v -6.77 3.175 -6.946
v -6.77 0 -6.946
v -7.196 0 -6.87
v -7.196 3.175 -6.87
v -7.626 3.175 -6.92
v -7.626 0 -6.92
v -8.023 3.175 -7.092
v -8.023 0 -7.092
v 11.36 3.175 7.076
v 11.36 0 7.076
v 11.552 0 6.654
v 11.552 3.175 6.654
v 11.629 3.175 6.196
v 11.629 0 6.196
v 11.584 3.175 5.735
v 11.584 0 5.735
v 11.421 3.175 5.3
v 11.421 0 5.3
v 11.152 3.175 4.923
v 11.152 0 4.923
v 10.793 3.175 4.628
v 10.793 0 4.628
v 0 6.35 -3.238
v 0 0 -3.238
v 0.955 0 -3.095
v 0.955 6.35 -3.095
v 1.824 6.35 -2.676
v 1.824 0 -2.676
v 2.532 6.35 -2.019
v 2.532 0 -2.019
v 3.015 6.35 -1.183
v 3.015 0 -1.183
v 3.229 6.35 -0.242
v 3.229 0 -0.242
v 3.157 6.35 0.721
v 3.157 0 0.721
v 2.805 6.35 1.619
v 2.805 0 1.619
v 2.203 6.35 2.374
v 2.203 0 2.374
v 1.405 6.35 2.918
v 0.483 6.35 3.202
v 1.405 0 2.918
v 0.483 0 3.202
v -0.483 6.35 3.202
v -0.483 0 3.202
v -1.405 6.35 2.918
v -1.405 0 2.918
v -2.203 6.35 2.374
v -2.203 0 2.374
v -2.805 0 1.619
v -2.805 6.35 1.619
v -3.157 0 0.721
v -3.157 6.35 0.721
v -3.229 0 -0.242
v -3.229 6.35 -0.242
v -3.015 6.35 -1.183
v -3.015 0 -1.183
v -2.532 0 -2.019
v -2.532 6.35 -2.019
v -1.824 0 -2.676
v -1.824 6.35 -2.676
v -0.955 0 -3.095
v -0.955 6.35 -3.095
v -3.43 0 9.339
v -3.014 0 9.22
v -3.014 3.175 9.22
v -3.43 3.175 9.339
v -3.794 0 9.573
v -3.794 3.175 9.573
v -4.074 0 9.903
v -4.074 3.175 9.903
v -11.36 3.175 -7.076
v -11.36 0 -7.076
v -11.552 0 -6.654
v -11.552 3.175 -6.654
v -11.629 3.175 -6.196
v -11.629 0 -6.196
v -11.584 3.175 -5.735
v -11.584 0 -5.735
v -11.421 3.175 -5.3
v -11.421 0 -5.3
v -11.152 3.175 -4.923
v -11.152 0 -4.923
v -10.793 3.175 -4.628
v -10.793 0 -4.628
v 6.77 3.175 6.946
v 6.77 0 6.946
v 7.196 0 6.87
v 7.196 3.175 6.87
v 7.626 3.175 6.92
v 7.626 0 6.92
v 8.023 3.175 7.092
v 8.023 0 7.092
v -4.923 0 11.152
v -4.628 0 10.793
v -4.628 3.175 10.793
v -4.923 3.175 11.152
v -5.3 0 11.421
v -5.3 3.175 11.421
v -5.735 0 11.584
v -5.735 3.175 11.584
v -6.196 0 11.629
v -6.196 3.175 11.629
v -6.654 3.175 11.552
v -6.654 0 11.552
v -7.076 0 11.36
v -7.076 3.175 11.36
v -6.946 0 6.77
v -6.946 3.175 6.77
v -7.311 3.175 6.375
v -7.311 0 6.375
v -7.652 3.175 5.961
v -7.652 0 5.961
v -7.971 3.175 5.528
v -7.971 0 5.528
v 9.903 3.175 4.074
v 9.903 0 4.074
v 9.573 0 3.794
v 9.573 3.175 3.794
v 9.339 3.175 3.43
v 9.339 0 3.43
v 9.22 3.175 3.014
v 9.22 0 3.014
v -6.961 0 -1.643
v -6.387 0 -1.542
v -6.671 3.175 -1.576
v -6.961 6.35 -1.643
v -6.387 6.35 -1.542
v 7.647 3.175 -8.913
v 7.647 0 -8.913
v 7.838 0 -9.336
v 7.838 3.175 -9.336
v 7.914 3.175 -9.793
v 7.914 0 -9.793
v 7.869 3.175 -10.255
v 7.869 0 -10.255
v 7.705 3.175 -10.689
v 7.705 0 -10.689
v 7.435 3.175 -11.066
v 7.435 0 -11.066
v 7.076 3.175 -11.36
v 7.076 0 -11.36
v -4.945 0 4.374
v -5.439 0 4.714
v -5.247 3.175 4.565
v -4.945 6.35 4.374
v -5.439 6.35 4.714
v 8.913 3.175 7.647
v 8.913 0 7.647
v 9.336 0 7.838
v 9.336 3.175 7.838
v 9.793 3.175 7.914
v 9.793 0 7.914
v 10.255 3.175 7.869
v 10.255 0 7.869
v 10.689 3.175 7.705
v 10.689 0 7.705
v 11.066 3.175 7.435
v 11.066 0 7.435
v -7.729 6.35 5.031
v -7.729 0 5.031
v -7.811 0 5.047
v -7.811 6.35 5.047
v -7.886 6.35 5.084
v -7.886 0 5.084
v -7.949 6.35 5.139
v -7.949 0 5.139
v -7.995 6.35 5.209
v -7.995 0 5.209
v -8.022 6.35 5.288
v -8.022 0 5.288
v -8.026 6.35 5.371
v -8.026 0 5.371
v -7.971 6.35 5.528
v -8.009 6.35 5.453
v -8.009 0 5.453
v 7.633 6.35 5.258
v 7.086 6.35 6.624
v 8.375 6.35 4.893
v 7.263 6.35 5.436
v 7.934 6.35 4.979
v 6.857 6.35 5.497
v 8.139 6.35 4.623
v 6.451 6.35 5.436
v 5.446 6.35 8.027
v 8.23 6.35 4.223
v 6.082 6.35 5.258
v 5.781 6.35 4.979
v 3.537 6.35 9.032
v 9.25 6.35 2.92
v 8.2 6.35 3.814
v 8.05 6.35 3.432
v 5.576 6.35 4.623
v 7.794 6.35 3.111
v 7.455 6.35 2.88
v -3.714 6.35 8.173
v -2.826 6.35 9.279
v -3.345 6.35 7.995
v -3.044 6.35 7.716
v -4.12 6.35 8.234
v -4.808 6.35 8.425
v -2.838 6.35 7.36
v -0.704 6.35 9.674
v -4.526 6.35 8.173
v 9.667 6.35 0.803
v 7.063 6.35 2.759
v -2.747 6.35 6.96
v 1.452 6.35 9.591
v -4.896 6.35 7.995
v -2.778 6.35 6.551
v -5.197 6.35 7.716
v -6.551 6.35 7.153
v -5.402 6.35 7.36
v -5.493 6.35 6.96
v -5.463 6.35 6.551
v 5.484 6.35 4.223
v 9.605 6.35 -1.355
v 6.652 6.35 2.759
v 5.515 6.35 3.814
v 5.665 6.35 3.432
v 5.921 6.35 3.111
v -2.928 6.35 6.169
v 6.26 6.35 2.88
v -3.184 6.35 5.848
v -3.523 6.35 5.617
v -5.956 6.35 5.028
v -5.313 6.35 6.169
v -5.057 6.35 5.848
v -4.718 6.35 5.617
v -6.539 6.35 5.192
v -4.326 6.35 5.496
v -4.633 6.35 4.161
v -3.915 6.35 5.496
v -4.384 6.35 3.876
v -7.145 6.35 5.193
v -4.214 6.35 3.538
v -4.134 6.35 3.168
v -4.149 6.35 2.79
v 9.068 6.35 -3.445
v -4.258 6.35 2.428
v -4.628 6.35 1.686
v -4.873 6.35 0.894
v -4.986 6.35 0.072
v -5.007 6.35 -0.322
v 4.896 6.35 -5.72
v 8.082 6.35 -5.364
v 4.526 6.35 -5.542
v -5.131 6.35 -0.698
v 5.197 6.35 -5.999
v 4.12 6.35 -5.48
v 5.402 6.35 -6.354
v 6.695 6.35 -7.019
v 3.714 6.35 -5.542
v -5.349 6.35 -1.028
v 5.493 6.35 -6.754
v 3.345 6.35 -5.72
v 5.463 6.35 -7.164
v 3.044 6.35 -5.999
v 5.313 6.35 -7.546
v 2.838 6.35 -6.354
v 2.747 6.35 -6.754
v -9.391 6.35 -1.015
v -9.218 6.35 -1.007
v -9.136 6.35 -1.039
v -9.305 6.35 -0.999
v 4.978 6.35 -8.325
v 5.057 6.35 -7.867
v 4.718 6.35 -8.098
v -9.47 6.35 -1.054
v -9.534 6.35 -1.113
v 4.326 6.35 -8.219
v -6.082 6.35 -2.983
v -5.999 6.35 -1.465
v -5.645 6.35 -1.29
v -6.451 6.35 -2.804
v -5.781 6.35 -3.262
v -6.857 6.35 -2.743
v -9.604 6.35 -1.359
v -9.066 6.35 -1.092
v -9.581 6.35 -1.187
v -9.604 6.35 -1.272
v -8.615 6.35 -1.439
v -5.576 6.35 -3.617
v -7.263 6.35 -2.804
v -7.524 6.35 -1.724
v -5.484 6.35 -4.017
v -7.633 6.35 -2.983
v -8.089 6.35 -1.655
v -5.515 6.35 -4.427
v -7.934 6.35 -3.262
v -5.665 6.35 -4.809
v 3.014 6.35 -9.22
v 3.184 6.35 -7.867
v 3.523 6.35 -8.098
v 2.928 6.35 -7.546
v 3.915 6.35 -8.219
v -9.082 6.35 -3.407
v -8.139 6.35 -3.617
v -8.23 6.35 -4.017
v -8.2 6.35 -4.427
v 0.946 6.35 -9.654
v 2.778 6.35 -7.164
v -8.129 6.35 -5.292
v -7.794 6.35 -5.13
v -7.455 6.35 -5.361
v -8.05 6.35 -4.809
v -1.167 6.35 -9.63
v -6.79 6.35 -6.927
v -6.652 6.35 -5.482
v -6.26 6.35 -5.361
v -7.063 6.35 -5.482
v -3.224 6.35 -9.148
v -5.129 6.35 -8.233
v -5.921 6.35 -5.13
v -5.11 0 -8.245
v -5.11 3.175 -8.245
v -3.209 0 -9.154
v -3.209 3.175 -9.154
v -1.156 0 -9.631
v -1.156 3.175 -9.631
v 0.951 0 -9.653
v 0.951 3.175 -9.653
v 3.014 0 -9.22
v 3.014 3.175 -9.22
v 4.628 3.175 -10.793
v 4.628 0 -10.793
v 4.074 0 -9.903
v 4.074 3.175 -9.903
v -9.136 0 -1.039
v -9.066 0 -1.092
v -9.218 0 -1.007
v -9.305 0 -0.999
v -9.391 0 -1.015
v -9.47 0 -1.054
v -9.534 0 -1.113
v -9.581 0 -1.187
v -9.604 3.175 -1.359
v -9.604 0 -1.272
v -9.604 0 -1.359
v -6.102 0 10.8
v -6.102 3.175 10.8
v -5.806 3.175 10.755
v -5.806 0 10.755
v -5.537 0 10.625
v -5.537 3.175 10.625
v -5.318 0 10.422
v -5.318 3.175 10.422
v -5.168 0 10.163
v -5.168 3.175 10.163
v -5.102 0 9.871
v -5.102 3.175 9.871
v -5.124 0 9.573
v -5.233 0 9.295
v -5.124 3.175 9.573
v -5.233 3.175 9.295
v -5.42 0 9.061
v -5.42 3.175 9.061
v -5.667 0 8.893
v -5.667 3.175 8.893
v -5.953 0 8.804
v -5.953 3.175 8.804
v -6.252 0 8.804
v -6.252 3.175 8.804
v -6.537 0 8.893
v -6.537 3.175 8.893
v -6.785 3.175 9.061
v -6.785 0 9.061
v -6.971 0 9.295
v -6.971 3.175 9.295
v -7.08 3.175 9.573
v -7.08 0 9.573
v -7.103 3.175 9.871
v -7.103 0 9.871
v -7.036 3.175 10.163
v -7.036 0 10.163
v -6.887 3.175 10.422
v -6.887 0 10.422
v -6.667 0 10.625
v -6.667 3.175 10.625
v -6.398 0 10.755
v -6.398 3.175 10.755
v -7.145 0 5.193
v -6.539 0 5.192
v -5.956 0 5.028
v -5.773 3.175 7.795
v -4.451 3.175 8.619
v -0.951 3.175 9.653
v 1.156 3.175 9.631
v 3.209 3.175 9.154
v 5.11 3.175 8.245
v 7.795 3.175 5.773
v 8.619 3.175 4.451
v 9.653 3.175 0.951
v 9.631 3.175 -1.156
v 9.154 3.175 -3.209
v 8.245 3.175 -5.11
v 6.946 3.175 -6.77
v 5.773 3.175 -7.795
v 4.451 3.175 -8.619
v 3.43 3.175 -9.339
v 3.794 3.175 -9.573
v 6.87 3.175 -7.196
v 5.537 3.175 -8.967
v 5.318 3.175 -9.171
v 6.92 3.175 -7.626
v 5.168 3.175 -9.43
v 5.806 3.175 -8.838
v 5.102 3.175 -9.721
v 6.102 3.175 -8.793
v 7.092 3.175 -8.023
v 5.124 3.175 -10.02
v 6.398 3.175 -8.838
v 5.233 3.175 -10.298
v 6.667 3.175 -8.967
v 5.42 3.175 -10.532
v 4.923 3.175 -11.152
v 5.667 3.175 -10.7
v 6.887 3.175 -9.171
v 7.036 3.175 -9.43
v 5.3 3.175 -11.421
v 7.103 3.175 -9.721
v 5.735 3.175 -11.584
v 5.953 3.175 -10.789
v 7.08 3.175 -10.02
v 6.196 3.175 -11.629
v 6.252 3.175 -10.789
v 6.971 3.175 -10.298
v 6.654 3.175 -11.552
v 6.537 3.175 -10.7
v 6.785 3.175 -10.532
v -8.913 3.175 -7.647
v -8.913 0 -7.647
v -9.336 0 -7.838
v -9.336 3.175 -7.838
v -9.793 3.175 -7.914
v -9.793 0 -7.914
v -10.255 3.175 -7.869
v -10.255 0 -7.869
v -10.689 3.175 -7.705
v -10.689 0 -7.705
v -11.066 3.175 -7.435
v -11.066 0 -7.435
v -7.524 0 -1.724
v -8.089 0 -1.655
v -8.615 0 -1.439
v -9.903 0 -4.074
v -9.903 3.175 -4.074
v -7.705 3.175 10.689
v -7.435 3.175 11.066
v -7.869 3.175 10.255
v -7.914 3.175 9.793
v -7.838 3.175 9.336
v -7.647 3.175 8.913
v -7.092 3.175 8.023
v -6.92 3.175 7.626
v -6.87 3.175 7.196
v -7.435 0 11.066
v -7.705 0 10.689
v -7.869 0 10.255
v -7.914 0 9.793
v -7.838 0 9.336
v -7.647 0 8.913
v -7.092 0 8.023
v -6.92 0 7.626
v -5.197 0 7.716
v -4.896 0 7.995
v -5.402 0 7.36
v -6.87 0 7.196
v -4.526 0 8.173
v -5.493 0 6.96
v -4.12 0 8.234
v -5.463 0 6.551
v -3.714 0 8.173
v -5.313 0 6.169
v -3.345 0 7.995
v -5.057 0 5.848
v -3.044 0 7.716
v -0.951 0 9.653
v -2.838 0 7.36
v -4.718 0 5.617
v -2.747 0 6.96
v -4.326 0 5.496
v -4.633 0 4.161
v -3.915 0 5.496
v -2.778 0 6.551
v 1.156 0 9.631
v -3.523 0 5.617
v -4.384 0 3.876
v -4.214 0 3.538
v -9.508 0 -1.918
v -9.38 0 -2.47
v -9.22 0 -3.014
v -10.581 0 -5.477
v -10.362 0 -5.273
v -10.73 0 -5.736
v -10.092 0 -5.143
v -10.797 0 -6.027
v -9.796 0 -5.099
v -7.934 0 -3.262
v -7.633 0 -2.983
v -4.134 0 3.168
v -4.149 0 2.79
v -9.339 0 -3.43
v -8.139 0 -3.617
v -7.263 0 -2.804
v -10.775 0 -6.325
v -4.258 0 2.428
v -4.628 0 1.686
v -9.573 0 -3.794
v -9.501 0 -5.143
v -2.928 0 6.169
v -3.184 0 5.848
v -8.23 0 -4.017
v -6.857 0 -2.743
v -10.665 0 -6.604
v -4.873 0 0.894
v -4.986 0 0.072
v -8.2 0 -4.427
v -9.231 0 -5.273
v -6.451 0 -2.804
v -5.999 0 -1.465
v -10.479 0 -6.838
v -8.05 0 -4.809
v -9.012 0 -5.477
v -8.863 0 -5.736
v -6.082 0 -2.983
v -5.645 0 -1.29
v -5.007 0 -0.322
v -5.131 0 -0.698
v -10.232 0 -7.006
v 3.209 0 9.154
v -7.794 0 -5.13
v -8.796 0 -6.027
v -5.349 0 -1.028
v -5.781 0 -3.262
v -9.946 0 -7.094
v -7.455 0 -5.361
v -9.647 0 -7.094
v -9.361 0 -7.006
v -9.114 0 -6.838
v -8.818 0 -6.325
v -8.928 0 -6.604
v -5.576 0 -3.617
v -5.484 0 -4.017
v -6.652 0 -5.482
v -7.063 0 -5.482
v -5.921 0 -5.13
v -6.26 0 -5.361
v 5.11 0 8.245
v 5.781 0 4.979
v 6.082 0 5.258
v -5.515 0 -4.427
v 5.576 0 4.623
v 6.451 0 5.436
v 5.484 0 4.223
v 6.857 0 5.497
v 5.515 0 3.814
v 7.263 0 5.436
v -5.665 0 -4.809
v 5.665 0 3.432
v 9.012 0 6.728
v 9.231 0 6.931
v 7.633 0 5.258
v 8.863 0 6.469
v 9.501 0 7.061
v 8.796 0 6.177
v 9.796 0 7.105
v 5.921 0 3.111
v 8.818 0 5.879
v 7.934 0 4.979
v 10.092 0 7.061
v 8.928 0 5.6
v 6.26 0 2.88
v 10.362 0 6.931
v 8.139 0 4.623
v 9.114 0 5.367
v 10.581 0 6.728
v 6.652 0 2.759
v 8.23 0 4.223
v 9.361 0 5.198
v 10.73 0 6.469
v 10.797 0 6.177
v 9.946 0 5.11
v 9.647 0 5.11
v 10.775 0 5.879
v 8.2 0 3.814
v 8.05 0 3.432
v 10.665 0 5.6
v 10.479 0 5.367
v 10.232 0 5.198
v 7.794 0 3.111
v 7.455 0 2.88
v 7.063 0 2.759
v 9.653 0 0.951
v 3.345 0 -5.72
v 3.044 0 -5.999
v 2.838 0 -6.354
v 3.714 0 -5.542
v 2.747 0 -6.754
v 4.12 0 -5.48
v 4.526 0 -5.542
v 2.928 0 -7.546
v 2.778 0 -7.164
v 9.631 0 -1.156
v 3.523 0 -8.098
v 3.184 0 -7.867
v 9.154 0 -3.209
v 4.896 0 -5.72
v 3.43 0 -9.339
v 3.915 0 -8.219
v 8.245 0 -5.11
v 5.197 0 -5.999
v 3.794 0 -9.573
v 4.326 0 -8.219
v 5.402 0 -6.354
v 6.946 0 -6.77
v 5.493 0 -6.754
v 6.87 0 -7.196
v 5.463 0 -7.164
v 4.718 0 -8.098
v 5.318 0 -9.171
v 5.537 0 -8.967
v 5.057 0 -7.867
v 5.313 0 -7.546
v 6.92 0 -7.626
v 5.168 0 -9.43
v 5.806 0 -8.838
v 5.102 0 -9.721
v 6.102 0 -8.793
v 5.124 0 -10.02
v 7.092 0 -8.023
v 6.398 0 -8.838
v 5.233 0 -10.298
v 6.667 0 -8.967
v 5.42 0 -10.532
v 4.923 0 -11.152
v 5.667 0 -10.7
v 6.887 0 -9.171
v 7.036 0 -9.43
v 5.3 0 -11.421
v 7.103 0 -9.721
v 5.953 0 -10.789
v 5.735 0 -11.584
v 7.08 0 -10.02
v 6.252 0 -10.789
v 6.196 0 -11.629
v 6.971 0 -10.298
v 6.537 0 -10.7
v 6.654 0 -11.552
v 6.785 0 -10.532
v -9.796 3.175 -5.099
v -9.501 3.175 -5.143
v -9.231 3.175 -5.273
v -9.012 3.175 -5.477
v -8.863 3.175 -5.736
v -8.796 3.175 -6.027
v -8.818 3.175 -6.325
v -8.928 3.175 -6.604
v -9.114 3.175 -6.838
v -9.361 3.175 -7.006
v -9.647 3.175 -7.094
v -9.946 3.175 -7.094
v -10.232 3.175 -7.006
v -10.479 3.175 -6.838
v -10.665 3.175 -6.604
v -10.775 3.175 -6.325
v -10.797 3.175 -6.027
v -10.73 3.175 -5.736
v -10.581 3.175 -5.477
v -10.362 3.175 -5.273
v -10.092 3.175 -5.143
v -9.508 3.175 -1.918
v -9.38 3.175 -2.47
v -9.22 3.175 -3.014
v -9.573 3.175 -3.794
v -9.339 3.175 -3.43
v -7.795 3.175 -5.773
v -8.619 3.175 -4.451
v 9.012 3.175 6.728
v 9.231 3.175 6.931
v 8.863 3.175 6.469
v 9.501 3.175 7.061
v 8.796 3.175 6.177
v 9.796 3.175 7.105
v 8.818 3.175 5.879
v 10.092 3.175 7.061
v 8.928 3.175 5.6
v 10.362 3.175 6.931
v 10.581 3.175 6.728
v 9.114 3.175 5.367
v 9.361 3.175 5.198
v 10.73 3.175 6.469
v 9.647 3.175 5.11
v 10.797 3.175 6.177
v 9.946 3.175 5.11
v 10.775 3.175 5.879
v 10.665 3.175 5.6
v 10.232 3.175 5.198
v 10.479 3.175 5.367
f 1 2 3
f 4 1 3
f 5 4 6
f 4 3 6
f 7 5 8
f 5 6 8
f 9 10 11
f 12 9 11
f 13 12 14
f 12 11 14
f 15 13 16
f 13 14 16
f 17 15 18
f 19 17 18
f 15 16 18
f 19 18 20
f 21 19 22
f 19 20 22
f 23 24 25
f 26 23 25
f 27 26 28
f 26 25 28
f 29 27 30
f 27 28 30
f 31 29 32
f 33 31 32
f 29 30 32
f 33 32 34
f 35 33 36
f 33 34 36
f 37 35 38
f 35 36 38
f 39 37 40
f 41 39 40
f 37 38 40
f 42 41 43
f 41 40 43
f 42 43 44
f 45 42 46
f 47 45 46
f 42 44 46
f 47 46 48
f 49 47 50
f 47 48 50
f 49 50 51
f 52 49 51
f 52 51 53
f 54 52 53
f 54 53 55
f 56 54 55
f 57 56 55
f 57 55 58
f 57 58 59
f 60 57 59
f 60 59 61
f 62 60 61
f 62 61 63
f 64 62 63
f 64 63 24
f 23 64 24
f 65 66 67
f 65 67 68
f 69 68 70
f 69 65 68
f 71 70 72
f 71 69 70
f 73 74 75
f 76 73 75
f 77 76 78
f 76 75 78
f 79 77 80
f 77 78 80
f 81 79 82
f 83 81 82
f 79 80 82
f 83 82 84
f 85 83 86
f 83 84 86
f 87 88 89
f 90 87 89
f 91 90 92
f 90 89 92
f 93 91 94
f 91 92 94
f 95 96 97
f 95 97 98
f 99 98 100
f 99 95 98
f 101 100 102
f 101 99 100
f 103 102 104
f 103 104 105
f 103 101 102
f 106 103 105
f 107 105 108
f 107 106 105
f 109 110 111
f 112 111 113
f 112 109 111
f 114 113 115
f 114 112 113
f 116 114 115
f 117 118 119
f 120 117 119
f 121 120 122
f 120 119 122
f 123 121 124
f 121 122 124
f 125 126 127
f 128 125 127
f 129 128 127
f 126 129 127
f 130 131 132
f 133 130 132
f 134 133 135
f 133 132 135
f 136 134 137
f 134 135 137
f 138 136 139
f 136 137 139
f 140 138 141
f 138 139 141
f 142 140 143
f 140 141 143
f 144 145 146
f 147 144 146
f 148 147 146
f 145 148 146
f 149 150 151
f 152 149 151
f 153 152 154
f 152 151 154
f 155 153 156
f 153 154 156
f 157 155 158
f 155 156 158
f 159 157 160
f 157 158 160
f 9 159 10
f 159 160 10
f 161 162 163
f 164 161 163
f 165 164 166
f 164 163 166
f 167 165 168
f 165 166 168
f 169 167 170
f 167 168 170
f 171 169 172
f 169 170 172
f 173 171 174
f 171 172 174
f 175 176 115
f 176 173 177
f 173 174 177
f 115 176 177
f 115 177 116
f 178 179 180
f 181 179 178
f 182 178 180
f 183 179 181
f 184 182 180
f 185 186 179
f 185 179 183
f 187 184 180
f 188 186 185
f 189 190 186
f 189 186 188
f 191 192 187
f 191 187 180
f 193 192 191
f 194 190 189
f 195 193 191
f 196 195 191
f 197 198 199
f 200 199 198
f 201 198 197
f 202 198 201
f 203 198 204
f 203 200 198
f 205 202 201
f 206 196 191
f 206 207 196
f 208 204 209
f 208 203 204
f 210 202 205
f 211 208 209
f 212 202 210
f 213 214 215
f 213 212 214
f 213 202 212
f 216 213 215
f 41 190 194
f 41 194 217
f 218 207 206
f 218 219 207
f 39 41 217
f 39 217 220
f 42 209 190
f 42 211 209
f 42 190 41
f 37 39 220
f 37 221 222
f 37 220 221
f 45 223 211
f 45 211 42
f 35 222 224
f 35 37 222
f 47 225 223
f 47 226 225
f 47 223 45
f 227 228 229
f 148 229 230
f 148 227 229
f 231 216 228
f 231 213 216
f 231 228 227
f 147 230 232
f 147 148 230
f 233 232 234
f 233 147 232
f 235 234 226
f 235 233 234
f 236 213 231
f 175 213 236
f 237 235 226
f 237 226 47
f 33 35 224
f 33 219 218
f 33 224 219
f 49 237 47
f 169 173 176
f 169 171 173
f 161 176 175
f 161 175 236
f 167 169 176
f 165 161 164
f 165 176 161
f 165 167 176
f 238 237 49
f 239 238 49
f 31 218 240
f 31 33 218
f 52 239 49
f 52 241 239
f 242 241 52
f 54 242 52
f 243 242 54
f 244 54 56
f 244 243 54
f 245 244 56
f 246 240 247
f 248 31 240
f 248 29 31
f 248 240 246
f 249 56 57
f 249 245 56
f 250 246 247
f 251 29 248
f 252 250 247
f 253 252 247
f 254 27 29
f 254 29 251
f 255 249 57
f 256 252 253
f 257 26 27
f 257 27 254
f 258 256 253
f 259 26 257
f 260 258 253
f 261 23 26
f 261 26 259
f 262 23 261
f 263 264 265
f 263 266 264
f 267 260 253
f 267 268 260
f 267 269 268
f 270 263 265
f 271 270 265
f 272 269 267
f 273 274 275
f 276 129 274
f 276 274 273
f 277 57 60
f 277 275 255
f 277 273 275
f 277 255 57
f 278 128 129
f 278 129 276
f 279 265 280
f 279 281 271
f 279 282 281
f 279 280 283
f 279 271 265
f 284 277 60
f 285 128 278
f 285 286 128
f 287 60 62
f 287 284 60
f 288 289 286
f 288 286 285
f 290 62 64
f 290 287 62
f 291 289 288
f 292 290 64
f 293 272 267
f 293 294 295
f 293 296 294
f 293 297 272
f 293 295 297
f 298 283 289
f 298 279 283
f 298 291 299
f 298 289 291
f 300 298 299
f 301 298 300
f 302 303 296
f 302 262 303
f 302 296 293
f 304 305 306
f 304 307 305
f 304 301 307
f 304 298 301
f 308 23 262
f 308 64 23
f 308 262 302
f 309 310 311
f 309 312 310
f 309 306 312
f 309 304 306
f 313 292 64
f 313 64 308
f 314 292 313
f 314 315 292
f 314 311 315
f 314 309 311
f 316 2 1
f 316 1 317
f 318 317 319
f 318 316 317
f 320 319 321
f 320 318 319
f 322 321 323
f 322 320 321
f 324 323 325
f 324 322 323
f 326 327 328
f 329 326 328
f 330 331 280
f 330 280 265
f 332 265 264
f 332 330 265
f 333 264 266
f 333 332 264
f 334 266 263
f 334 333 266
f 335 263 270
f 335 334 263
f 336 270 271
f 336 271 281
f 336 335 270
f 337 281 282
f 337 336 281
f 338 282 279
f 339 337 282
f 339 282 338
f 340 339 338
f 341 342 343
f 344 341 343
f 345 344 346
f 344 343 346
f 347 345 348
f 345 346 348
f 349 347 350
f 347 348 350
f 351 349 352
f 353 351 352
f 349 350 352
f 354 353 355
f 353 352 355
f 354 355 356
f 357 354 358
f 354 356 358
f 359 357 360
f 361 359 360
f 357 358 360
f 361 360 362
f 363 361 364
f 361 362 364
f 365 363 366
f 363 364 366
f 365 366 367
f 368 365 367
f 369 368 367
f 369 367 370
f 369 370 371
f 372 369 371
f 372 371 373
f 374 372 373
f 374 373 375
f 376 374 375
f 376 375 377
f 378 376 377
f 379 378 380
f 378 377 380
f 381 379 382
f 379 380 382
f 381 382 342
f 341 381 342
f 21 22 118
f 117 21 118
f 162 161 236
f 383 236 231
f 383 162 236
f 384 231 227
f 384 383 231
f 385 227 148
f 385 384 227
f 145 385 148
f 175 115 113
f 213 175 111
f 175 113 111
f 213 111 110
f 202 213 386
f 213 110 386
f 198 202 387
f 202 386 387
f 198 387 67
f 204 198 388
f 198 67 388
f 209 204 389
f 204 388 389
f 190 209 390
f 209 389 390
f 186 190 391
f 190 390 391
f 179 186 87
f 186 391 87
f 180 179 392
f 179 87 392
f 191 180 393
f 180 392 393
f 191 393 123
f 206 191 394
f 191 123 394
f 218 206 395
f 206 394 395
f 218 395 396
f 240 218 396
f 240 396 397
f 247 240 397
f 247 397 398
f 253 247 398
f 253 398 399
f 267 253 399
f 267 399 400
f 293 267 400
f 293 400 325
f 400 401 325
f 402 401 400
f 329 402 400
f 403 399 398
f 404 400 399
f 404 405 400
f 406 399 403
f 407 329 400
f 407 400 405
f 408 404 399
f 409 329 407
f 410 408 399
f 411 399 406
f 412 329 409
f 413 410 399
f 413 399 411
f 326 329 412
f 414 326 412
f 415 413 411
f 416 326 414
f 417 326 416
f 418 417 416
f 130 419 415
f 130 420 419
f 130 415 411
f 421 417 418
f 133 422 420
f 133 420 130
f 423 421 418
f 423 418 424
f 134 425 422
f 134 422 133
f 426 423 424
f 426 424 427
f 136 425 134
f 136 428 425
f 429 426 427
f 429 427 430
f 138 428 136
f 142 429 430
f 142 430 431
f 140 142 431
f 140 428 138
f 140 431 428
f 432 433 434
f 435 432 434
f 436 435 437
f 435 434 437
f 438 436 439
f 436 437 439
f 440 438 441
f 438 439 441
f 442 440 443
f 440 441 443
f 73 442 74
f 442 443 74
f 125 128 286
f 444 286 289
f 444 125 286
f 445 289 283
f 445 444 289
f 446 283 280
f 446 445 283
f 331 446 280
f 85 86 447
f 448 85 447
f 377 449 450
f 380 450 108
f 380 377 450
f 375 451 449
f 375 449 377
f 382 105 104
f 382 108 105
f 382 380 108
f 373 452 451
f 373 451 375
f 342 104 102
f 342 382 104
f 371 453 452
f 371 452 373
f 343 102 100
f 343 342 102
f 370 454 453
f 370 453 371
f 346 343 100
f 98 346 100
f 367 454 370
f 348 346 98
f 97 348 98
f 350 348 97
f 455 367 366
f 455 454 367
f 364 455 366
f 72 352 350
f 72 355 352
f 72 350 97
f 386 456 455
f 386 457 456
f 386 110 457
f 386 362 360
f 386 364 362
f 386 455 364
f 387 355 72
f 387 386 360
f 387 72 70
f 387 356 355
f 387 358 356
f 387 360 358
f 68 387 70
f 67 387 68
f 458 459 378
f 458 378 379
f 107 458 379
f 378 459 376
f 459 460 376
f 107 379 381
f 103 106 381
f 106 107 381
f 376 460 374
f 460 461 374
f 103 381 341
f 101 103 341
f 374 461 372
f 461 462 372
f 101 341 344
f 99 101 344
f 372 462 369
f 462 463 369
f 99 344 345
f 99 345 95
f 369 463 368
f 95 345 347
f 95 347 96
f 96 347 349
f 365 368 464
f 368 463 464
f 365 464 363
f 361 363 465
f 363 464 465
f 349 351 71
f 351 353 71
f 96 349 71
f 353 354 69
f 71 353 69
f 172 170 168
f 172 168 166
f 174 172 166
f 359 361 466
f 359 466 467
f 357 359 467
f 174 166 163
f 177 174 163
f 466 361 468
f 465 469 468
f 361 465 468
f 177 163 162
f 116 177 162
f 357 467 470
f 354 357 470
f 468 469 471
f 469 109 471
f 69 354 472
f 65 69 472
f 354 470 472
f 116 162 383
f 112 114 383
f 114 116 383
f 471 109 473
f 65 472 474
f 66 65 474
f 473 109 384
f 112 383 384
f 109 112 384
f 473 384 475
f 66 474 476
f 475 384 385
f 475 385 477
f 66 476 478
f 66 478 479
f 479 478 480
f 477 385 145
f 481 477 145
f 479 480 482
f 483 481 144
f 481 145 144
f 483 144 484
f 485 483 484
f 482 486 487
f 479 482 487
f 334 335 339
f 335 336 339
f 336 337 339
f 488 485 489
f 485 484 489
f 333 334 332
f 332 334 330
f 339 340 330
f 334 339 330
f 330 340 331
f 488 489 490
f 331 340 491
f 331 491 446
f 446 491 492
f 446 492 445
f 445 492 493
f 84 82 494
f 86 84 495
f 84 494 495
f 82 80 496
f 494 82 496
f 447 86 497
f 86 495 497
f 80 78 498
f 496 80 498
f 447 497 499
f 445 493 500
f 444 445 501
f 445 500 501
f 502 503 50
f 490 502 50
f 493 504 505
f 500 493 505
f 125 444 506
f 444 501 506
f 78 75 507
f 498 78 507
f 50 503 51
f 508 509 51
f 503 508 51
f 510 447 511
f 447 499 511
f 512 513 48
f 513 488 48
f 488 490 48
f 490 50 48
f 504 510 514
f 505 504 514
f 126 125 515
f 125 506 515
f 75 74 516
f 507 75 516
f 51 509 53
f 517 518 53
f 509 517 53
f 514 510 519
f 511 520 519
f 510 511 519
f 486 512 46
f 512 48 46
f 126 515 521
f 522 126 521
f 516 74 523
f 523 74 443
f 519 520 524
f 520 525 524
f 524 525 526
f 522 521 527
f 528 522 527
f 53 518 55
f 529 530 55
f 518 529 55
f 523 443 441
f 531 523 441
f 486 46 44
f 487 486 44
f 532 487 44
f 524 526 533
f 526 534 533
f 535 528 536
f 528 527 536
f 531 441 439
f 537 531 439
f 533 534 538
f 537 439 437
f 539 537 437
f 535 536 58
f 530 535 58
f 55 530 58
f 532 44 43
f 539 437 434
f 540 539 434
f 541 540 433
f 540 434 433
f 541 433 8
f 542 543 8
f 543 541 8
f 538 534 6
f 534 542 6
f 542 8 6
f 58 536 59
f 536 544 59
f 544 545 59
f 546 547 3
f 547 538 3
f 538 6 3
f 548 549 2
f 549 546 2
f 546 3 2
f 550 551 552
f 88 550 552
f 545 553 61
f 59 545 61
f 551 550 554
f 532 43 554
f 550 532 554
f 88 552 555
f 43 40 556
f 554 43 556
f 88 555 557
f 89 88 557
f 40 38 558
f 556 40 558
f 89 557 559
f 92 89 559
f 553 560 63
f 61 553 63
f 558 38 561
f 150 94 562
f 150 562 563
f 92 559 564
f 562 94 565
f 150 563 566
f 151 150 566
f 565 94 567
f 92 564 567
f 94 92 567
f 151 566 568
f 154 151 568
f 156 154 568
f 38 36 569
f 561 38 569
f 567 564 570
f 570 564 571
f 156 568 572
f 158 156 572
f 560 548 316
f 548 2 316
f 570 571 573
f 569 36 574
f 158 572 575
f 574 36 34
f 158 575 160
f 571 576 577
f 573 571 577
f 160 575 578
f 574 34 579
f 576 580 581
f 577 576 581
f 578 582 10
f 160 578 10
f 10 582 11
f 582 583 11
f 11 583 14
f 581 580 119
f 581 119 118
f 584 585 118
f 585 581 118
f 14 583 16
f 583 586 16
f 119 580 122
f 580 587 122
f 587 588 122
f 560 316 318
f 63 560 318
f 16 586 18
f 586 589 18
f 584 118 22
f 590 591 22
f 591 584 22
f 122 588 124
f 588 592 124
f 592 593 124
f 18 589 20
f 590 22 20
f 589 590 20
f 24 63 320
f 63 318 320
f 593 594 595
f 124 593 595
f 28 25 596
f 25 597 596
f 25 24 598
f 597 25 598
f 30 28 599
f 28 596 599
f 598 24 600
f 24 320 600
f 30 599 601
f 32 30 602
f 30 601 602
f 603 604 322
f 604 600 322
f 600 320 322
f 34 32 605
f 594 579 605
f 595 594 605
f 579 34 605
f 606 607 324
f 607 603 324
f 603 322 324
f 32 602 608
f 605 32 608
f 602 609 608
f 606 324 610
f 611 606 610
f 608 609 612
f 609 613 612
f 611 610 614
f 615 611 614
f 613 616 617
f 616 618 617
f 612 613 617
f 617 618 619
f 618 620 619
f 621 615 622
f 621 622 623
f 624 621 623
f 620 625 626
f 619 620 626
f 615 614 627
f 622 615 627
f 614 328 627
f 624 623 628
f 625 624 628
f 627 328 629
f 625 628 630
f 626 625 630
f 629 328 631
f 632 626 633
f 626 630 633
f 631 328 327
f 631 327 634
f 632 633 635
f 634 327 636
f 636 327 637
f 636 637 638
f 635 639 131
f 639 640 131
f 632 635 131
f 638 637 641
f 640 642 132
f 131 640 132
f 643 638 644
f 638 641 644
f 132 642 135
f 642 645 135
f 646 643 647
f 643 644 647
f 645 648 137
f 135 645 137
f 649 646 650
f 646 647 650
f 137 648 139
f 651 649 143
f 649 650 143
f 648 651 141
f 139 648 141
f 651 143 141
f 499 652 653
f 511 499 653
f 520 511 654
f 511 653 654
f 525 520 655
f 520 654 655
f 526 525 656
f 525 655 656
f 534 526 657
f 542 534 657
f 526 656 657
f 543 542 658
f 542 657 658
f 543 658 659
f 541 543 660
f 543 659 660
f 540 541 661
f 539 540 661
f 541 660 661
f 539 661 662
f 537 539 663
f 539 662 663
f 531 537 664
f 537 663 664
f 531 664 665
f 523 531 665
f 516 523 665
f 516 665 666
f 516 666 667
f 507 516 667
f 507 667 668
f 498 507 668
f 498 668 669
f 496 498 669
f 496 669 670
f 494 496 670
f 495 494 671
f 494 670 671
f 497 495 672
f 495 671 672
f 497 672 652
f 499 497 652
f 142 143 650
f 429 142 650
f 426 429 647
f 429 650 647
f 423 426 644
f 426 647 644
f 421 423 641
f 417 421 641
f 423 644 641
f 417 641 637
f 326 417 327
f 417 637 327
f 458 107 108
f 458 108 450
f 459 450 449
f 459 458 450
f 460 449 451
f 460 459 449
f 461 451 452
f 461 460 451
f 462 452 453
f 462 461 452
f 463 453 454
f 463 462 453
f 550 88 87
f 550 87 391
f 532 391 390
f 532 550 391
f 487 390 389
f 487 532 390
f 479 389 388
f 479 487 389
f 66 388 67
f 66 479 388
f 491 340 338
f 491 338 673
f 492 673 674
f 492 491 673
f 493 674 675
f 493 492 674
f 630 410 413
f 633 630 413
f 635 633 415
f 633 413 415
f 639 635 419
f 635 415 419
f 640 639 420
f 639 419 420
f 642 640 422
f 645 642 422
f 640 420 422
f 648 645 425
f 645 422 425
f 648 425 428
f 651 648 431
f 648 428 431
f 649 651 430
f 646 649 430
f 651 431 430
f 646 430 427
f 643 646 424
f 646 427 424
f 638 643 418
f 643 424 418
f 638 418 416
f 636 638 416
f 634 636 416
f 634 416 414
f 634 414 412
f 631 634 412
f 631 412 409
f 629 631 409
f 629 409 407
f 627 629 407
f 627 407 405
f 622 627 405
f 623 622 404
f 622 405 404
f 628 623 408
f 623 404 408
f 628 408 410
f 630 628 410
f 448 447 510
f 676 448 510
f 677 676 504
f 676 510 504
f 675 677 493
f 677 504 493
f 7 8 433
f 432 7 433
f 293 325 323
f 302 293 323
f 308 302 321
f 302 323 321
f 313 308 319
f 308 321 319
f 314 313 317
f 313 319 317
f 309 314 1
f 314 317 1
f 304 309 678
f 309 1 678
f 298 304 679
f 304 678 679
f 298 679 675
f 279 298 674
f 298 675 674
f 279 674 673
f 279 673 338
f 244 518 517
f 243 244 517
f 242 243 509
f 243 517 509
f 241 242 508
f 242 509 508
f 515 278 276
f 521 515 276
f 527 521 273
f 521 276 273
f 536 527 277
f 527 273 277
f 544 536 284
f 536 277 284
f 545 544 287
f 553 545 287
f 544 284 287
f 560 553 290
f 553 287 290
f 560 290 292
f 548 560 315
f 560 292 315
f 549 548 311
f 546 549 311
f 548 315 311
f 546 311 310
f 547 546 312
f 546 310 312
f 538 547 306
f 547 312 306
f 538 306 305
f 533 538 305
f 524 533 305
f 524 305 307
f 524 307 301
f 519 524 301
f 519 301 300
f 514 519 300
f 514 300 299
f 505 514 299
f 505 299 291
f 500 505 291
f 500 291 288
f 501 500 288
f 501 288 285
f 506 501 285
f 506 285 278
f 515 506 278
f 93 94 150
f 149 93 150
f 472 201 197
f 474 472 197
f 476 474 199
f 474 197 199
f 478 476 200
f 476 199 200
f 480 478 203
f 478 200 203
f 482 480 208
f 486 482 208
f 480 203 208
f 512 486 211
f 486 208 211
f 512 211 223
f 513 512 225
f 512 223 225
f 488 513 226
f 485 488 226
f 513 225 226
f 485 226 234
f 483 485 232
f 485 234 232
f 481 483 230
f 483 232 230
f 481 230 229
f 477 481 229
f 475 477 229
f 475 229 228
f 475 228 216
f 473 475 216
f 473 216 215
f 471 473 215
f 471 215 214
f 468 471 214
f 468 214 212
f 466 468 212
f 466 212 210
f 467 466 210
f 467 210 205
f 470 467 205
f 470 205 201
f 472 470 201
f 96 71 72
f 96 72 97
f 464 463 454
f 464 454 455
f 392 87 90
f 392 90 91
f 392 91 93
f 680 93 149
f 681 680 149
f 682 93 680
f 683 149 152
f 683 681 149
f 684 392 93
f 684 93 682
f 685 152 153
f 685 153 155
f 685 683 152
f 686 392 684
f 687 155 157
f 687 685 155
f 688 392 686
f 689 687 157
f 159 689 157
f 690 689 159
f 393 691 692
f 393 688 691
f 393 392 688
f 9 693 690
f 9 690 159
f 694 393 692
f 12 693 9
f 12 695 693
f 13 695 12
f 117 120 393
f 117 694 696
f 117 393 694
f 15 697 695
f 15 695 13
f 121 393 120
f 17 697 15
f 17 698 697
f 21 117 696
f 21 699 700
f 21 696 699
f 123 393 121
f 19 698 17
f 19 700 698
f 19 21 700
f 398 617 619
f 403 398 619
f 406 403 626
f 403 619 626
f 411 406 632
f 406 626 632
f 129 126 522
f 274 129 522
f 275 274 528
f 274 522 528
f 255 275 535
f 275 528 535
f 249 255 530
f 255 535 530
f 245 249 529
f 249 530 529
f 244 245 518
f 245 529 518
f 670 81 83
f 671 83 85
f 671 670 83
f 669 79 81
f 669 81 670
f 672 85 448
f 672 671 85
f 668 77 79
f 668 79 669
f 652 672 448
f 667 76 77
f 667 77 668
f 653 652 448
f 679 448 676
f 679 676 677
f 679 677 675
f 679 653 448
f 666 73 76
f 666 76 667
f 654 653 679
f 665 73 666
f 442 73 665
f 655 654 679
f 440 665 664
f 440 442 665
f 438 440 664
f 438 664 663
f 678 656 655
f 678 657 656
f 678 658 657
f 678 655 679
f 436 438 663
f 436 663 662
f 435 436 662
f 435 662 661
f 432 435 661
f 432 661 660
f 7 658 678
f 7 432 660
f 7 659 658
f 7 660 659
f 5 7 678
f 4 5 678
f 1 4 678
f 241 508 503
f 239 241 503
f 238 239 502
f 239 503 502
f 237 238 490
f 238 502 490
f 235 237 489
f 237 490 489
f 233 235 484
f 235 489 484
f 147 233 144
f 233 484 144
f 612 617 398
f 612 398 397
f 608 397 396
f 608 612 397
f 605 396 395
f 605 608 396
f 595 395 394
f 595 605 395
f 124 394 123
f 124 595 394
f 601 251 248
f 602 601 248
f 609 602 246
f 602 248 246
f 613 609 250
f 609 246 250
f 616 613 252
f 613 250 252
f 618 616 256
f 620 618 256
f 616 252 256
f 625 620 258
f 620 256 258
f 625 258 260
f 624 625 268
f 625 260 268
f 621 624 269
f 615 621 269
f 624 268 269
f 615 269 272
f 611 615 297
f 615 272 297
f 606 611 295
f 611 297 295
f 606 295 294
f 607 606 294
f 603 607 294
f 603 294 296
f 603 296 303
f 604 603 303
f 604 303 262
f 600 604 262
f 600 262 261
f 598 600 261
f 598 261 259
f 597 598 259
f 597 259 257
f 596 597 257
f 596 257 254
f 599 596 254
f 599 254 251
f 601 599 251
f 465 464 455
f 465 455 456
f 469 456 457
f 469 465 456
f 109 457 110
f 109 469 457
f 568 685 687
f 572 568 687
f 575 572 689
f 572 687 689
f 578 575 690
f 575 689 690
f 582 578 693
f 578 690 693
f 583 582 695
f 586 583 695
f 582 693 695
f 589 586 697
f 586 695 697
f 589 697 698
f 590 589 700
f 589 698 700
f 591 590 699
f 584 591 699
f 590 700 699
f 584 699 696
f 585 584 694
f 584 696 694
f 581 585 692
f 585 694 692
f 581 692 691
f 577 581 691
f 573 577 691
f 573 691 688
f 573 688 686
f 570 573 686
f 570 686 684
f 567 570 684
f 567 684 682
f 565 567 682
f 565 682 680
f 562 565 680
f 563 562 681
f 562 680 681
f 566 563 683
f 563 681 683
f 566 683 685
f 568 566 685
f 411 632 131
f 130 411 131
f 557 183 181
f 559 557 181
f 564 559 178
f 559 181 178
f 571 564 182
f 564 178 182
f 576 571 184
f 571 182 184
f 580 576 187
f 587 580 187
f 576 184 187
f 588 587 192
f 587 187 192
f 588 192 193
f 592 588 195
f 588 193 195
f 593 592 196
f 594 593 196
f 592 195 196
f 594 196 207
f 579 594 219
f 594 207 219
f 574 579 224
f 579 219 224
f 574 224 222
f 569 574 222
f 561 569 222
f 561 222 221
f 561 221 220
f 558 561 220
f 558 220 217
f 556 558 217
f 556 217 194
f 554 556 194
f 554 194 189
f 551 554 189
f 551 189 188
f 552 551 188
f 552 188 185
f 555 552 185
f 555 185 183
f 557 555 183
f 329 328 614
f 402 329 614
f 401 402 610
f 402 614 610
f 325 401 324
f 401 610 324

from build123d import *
from build123d.topology import SkipClean

# Parameters (mm, degrees)
BOSS_EXTRUDE2_DEPTH = 3.175
SKETCH3_R           = 9.700000031
BOSS_EXTRUDE4_DEPTH = 3.175
SKETCH4_R           = 1.0033
CUT_EXTRUDE1_DEPTH  = 3.175
SKETCH6_R           = 1.25
CUT_EXTRUDE2_DEPTH  = 18.630160878
CUT_EXTRUDE3_DEPTH  = 18.630161045
CUT_EXTRUDE4_DEPTH  = 18.630161045
SKETCH9_R           = 3.2385
CUT_EXTRUDE5_DEPTH  = 18.630161045
SKETCH11_R          = 1.377
CUT_EXTRUDE7_DEPTH  = 18.630161045


with BuildPart() as part:
    # Sketch1 → Boss-Extrude2 (new body)
    with BuildSketch(Plane(origin=(0, 0, 0), x_dir=(1, 0, 0), z_dir=(0, 1, 0))):
        with BuildLine():
            ThreePointArc((-11.359521952, 7.075729248), (-11.584059991, 5.734660127), (-10.793437735, 4.628405109))
            Line((-10.793437735, 4.628405109), (-9.903263338, 4.073924644))
            ThreePointArc((-9.903263338, 4.073924644), (-9.442762789, 3.620550105), (-9.219865441, 3.013981065))
            ThreePointArc((-9.219865441, 3.013981065), (-8.233383025, 5.128489502), (-6.770495536, 6.946250125))
            ThreePointArc((-6.770495536, 6.946250125), (-7.413198477, 6.878854591), (-8.023169667, 7.092265875))
            Line((-8.023169667, 7.092265875), (-8.913344063, 7.64674634))
            ThreePointArc((-8.913344063, 7.64674634), (-10.254863148, 7.868580207), (-11.359521952, 7.075729248))
        make_face()
        with BuildLine():
            ThreePointArc((-7.092265875, -8.023169667), (-6.878854591, -7.413198477), (-6.946250125, -6.770495536))
            ThreePointArc((-6.946250125, -6.770495536), (5.128489502, 8.233383025), (-3.013981065, -9.219865441))
            ThreePointArc((-3.013981065, -9.219865441), (-3.620550105, -9.442762789), (-4.073924644, -9.903263338))
            Line((-4.073924644, -9.903263338), (-4.628405109, -10.793437735))
            ThreePointArc((-4.628405109, -10.793437735), (-5.734660127, -11.584059991), (-7.075729248, -11.359521952))
            ThreePointArc((-7.075729248, -11.359521952), (-7.868580207, -10.254863148), (-7.64674634, -8.913344063))
            Line((-7.64674634, -8.913344063), (-7.092265875, -8.023169667))
        make_face()
        with BuildLine():
            ThreePointArc((4.073924644, 9.903263338), (3.620550105, 9.442762789), (3.013981065, 9.219865441))
            ThreePointArc((3.013981065, 9.219865441), (5.128489502, 8.233383025), (6.946250125, 6.770495536))
            ThreePointArc((6.946250125, 6.770495536), (6.878854591, 7.413198477), (7.092265875, 8.023169667))
            Line((7.092265875, 8.023169667), (7.64674634, 8.913344063))
            ThreePointArc((7.64674634, 8.913344063), (7.868580207, 10.254863148), (7.075729248, 11.359521952))
            ThreePointArc((7.075729248, 11.359521952), (5.734660127, 11.584059991), (4.628405109, 10.793437735))
            Line((4.628405109, 10.793437735), (4.073924644, 9.903263338))
        make_face()
        with BuildLine():
            ThreePointArc((9.903263338, -4.073924644), (9.442762789, -3.620550105), (9.219865441, -3.013981065))
            ThreePointArc((9.219865441, -3.013981065), (8.233383025, -5.128489502), (6.770495536, -6.946250125))
            ThreePointArc((6.770495536, -6.946250125), (7.413198477, -6.878854591), (8.023169667, -7.092265875))
            Line((8.023169667, -7.092265875), (8.913344063, -7.64674634))
            ThreePointArc((8.913344063, -7.64674634), (10.254863148, -7.868580207), (11.359521952, -7.075729248))
            ThreePointArc((11.359521952, -7.075729248), (11.584059991, -5.734660127), (10.793437735, -4.628405109))
            Line((10.793437735, -4.628405109), (9.903263338, -4.073924644))
        make_face()
    extrude(amount=BOSS_EXTRUDE2_DEPTH)

    # Sketch3 → Boss-Extrude4 (add)
    with BuildSketch(Plane(origin=(0, 3.175, 0), x_dir=(1, 0, 0), z_dir=(0, 1, 0))):
        with Locations(Location((0, 0, 0), (0, 0, 71.897391919))):
            Circle(SKETCH3_R)
    extrude(amount=BOSS_EXTRUDE4_DEPTH)

    # Sketch4 → Cut-Extrude1 (cut)
    with BuildSketch(Plane(origin=(0, 3.175, 0), x_dir=(1, 0, 0), z_dir=(0, 1, 0))):
        with Locations(Location((-6.102109375, -9.796452489, 0), (0, 0, 270))):
            Circle(SKETCH4_R)
        with Locations(Location((-9.796452489, 6.102109375, 0), (0, 0, 270))):
            Circle(SKETCH4_R)
        with Locations(Location((6.102109375, 9.796452489, 0), (0, 0, 270))):
            Circle(SKETCH4_R)
        with Locations(Location((9.796452489, -6.102109375, 0), (0, 0, 270))):
            Circle(SKETCH4_R)
    extrude(amount=-CUT_EXTRUDE1_DEPTH, mode=Mode.SUBTRACT)

    # Sketch6 → Cut-Extrude2 (cut, through all)
    with BuildSketch(Plane.XZ):
        with Locations(Location((-4.120304599, 6.857338406, 0), (0, 0, 270))):
            Circle(SKETCH6_R)
        with Locations(Location((6.857338406, 4.120304599, 0), (0, 0, 270))):
            Circle(SKETCH6_R)
        with Locations(Location((4.120304599, -6.857338406, 0), (0, 0, 270))):
            Circle(SKETCH6_R)
        with Locations(Location((-6.857338406, -4.120304599, 0), (0, 0, 270))):
            Circle(SKETCH6_R)
        with BuildLine():
            ThreePointArc((-7.740826737, 4.188918313), (-8.600917053, 2.001520862), (-8.865312738, -0.333978632))
            ThreePointArc((-8.865312738, -0.333978632), (-8.220855367, -1.436176951), (-6.960889199, -1.642699812))
            add(Edge.make_bspline(
                [(-6.960889199, -1.642699812), (-6.667021958, -1.55913113), (-6.387287356, -1.541557431)],
                knots=[0, 0, 0, 1, 1, 1], degree=2))
            ThreePointArc((-6.387287356, -1.541557431), (-5.348606232, -1.027965094), (-4.985782131, 0.07248674))
            ThreePointArc((-4.985782131, 0.07248674), (-4.766455839, 1.294643053), (-4.258288499, 2.427575545))
            ThreePointArc((-4.258288499, 2.427575545), (-4.213628063, 3.537788389), (-4.945115585, 4.374145441))
            add(Edge.make_bspline(
                [(-4.945115585, 4.374145441), (-5.082112842, 4.444222059), (-5.247145609, 4.565325221), (-5.339984058, 4.633451266), (-5.43868295, 4.713583878)],
                knots=[0, 0, 0, 0.6, 0.6, 1, 1, 1], degree=2))
            ThreePointArc((-5.43868295, 4.713583878), (-6.717452114, 5.011565124), (-7.740826737, 4.188918313))
        make_face()
    extrude(amount=-CUT_EXTRUDE2_DEPTH, mode=Mode.SUBTRACT)

    # Sketch7 → Cut-Extrude3 (cut, through all)
    with SkipClean():  # the faces are left unmerged after this step: merging them gives an invalid solid
        with BuildSketch(Plane.XZ):
            with BuildLine():
                ThreePointArc((-6.960889199, -1.642699812), (-8.884242595, -1.255389349), (-9.685199878, 0.535634133))
                ThreePointArc((-9.685199878, 0.535634133), (-9.438161419, 2.238550786), (-8.894109958, 3.871021655))
                ThreePointArc((-8.894109958, 3.871021655), (-7.375413308, 5.149500563), (-5.43868295, 4.713583878))
                ThreePointArc((-5.43868295, 4.713583878), (-6.717452114, 5.011565124), (-7.740826737, 4.188918313))
                ThreePointArc((-7.740826737, 4.188918313), (-8.600917053, 2.001520862), (-8.865312738, -0.333978632))
                ThreePointArc((-8.865312738, -0.333978632), (-8.220855367, -1.436176951), (-6.960889199, -1.642699812))
            make_face()
        extrude(amount=-CUT_EXTRUDE3_DEPTH, mode=Mode.SUBTRACT)

    # Sketch8 → Cut-Extrude4 (cut, through all)
    with SkipClean():  # the faces are left unmerged after this step: merging them gives an invalid solid
        with BuildSketch(Plane.XZ):
            with BuildLine():
                Line((-9.60430299, -1.35917794), (-10.364546908, 0.869720512))
                Line((-10.364546908, 0.869720512), (-8.848022827, 0.869720512))
                Line((-8.848022827, 0.869720512), (-9.066395788, -1.091827064))
                ThreePointArc((-9.066395788, -1.091827064), (-9.431806259, -1.031432276), (-9.60430299, -1.35917794))
            make_face()
            with BuildLine():
                Line((-8.296144244, 3.19654695), (-7.610330094, 5.047226445))
                ThreePointArc((-7.610330094, 5.047226445), (-7.963941166, 5.15736977), (-7.97087416, 5.527672722))
                Line((-7.97087416, 5.527672722), (-9.651132171, 3.877614498))
                Line((-9.651132171, 3.877614498), (-8.296144244, 3.19654695))
            make_face()
        extrude(amount=-CUT_EXTRUDE4_DEPTH, mode=Mode.SUBTRACT)

    # Sketch9 → Cut-Extrude5 (cut, through all)
    with SkipClean():  # the faces are left unmerged after this step: merging them gives an invalid solid
        with BuildSketch(Plane.XZ):
            with Locations(Location((0, 0, 0), (0, 0, 270))):
                Circle(SKETCH9_R)
        extrude(amount=-CUT_EXTRUDE5_DEPTH, mode=Mode.SUBTRACT)

    # Sketch11 → Cut-Extrude7 (cut, through all)
    with SkipClean():  # the faces are left unmerged after this step: merging them gives an invalid solid
        with BuildSketch(Plane(origin=(0, 6.35, 0), x_dir=(1, 0, 0), z_dir=(0, 1, 0))):
            with Locations(Location((-6.857338406, 4.120304599, 0), (0, 0, 270))):
                Circle(SKETCH11_R)
            with Locations(Location((4.120304599, 6.857338406, 0), (0, 0, 270))):
                Circle(SKETCH11_R)
            with Locations(Location((6.857338406, -4.120304599, 0), (0, 0, 270))):
                Circle(SKETCH11_R)
            with Locations(Location((-4.120304599, -6.857338406, 0), (0, 0, 270))):
                Circle(SKETCH11_R)
        extrude(amount=-CUT_EXTRUDE7_DEPTH, mode=Mode.SUBTRACT)


solid = part.part
